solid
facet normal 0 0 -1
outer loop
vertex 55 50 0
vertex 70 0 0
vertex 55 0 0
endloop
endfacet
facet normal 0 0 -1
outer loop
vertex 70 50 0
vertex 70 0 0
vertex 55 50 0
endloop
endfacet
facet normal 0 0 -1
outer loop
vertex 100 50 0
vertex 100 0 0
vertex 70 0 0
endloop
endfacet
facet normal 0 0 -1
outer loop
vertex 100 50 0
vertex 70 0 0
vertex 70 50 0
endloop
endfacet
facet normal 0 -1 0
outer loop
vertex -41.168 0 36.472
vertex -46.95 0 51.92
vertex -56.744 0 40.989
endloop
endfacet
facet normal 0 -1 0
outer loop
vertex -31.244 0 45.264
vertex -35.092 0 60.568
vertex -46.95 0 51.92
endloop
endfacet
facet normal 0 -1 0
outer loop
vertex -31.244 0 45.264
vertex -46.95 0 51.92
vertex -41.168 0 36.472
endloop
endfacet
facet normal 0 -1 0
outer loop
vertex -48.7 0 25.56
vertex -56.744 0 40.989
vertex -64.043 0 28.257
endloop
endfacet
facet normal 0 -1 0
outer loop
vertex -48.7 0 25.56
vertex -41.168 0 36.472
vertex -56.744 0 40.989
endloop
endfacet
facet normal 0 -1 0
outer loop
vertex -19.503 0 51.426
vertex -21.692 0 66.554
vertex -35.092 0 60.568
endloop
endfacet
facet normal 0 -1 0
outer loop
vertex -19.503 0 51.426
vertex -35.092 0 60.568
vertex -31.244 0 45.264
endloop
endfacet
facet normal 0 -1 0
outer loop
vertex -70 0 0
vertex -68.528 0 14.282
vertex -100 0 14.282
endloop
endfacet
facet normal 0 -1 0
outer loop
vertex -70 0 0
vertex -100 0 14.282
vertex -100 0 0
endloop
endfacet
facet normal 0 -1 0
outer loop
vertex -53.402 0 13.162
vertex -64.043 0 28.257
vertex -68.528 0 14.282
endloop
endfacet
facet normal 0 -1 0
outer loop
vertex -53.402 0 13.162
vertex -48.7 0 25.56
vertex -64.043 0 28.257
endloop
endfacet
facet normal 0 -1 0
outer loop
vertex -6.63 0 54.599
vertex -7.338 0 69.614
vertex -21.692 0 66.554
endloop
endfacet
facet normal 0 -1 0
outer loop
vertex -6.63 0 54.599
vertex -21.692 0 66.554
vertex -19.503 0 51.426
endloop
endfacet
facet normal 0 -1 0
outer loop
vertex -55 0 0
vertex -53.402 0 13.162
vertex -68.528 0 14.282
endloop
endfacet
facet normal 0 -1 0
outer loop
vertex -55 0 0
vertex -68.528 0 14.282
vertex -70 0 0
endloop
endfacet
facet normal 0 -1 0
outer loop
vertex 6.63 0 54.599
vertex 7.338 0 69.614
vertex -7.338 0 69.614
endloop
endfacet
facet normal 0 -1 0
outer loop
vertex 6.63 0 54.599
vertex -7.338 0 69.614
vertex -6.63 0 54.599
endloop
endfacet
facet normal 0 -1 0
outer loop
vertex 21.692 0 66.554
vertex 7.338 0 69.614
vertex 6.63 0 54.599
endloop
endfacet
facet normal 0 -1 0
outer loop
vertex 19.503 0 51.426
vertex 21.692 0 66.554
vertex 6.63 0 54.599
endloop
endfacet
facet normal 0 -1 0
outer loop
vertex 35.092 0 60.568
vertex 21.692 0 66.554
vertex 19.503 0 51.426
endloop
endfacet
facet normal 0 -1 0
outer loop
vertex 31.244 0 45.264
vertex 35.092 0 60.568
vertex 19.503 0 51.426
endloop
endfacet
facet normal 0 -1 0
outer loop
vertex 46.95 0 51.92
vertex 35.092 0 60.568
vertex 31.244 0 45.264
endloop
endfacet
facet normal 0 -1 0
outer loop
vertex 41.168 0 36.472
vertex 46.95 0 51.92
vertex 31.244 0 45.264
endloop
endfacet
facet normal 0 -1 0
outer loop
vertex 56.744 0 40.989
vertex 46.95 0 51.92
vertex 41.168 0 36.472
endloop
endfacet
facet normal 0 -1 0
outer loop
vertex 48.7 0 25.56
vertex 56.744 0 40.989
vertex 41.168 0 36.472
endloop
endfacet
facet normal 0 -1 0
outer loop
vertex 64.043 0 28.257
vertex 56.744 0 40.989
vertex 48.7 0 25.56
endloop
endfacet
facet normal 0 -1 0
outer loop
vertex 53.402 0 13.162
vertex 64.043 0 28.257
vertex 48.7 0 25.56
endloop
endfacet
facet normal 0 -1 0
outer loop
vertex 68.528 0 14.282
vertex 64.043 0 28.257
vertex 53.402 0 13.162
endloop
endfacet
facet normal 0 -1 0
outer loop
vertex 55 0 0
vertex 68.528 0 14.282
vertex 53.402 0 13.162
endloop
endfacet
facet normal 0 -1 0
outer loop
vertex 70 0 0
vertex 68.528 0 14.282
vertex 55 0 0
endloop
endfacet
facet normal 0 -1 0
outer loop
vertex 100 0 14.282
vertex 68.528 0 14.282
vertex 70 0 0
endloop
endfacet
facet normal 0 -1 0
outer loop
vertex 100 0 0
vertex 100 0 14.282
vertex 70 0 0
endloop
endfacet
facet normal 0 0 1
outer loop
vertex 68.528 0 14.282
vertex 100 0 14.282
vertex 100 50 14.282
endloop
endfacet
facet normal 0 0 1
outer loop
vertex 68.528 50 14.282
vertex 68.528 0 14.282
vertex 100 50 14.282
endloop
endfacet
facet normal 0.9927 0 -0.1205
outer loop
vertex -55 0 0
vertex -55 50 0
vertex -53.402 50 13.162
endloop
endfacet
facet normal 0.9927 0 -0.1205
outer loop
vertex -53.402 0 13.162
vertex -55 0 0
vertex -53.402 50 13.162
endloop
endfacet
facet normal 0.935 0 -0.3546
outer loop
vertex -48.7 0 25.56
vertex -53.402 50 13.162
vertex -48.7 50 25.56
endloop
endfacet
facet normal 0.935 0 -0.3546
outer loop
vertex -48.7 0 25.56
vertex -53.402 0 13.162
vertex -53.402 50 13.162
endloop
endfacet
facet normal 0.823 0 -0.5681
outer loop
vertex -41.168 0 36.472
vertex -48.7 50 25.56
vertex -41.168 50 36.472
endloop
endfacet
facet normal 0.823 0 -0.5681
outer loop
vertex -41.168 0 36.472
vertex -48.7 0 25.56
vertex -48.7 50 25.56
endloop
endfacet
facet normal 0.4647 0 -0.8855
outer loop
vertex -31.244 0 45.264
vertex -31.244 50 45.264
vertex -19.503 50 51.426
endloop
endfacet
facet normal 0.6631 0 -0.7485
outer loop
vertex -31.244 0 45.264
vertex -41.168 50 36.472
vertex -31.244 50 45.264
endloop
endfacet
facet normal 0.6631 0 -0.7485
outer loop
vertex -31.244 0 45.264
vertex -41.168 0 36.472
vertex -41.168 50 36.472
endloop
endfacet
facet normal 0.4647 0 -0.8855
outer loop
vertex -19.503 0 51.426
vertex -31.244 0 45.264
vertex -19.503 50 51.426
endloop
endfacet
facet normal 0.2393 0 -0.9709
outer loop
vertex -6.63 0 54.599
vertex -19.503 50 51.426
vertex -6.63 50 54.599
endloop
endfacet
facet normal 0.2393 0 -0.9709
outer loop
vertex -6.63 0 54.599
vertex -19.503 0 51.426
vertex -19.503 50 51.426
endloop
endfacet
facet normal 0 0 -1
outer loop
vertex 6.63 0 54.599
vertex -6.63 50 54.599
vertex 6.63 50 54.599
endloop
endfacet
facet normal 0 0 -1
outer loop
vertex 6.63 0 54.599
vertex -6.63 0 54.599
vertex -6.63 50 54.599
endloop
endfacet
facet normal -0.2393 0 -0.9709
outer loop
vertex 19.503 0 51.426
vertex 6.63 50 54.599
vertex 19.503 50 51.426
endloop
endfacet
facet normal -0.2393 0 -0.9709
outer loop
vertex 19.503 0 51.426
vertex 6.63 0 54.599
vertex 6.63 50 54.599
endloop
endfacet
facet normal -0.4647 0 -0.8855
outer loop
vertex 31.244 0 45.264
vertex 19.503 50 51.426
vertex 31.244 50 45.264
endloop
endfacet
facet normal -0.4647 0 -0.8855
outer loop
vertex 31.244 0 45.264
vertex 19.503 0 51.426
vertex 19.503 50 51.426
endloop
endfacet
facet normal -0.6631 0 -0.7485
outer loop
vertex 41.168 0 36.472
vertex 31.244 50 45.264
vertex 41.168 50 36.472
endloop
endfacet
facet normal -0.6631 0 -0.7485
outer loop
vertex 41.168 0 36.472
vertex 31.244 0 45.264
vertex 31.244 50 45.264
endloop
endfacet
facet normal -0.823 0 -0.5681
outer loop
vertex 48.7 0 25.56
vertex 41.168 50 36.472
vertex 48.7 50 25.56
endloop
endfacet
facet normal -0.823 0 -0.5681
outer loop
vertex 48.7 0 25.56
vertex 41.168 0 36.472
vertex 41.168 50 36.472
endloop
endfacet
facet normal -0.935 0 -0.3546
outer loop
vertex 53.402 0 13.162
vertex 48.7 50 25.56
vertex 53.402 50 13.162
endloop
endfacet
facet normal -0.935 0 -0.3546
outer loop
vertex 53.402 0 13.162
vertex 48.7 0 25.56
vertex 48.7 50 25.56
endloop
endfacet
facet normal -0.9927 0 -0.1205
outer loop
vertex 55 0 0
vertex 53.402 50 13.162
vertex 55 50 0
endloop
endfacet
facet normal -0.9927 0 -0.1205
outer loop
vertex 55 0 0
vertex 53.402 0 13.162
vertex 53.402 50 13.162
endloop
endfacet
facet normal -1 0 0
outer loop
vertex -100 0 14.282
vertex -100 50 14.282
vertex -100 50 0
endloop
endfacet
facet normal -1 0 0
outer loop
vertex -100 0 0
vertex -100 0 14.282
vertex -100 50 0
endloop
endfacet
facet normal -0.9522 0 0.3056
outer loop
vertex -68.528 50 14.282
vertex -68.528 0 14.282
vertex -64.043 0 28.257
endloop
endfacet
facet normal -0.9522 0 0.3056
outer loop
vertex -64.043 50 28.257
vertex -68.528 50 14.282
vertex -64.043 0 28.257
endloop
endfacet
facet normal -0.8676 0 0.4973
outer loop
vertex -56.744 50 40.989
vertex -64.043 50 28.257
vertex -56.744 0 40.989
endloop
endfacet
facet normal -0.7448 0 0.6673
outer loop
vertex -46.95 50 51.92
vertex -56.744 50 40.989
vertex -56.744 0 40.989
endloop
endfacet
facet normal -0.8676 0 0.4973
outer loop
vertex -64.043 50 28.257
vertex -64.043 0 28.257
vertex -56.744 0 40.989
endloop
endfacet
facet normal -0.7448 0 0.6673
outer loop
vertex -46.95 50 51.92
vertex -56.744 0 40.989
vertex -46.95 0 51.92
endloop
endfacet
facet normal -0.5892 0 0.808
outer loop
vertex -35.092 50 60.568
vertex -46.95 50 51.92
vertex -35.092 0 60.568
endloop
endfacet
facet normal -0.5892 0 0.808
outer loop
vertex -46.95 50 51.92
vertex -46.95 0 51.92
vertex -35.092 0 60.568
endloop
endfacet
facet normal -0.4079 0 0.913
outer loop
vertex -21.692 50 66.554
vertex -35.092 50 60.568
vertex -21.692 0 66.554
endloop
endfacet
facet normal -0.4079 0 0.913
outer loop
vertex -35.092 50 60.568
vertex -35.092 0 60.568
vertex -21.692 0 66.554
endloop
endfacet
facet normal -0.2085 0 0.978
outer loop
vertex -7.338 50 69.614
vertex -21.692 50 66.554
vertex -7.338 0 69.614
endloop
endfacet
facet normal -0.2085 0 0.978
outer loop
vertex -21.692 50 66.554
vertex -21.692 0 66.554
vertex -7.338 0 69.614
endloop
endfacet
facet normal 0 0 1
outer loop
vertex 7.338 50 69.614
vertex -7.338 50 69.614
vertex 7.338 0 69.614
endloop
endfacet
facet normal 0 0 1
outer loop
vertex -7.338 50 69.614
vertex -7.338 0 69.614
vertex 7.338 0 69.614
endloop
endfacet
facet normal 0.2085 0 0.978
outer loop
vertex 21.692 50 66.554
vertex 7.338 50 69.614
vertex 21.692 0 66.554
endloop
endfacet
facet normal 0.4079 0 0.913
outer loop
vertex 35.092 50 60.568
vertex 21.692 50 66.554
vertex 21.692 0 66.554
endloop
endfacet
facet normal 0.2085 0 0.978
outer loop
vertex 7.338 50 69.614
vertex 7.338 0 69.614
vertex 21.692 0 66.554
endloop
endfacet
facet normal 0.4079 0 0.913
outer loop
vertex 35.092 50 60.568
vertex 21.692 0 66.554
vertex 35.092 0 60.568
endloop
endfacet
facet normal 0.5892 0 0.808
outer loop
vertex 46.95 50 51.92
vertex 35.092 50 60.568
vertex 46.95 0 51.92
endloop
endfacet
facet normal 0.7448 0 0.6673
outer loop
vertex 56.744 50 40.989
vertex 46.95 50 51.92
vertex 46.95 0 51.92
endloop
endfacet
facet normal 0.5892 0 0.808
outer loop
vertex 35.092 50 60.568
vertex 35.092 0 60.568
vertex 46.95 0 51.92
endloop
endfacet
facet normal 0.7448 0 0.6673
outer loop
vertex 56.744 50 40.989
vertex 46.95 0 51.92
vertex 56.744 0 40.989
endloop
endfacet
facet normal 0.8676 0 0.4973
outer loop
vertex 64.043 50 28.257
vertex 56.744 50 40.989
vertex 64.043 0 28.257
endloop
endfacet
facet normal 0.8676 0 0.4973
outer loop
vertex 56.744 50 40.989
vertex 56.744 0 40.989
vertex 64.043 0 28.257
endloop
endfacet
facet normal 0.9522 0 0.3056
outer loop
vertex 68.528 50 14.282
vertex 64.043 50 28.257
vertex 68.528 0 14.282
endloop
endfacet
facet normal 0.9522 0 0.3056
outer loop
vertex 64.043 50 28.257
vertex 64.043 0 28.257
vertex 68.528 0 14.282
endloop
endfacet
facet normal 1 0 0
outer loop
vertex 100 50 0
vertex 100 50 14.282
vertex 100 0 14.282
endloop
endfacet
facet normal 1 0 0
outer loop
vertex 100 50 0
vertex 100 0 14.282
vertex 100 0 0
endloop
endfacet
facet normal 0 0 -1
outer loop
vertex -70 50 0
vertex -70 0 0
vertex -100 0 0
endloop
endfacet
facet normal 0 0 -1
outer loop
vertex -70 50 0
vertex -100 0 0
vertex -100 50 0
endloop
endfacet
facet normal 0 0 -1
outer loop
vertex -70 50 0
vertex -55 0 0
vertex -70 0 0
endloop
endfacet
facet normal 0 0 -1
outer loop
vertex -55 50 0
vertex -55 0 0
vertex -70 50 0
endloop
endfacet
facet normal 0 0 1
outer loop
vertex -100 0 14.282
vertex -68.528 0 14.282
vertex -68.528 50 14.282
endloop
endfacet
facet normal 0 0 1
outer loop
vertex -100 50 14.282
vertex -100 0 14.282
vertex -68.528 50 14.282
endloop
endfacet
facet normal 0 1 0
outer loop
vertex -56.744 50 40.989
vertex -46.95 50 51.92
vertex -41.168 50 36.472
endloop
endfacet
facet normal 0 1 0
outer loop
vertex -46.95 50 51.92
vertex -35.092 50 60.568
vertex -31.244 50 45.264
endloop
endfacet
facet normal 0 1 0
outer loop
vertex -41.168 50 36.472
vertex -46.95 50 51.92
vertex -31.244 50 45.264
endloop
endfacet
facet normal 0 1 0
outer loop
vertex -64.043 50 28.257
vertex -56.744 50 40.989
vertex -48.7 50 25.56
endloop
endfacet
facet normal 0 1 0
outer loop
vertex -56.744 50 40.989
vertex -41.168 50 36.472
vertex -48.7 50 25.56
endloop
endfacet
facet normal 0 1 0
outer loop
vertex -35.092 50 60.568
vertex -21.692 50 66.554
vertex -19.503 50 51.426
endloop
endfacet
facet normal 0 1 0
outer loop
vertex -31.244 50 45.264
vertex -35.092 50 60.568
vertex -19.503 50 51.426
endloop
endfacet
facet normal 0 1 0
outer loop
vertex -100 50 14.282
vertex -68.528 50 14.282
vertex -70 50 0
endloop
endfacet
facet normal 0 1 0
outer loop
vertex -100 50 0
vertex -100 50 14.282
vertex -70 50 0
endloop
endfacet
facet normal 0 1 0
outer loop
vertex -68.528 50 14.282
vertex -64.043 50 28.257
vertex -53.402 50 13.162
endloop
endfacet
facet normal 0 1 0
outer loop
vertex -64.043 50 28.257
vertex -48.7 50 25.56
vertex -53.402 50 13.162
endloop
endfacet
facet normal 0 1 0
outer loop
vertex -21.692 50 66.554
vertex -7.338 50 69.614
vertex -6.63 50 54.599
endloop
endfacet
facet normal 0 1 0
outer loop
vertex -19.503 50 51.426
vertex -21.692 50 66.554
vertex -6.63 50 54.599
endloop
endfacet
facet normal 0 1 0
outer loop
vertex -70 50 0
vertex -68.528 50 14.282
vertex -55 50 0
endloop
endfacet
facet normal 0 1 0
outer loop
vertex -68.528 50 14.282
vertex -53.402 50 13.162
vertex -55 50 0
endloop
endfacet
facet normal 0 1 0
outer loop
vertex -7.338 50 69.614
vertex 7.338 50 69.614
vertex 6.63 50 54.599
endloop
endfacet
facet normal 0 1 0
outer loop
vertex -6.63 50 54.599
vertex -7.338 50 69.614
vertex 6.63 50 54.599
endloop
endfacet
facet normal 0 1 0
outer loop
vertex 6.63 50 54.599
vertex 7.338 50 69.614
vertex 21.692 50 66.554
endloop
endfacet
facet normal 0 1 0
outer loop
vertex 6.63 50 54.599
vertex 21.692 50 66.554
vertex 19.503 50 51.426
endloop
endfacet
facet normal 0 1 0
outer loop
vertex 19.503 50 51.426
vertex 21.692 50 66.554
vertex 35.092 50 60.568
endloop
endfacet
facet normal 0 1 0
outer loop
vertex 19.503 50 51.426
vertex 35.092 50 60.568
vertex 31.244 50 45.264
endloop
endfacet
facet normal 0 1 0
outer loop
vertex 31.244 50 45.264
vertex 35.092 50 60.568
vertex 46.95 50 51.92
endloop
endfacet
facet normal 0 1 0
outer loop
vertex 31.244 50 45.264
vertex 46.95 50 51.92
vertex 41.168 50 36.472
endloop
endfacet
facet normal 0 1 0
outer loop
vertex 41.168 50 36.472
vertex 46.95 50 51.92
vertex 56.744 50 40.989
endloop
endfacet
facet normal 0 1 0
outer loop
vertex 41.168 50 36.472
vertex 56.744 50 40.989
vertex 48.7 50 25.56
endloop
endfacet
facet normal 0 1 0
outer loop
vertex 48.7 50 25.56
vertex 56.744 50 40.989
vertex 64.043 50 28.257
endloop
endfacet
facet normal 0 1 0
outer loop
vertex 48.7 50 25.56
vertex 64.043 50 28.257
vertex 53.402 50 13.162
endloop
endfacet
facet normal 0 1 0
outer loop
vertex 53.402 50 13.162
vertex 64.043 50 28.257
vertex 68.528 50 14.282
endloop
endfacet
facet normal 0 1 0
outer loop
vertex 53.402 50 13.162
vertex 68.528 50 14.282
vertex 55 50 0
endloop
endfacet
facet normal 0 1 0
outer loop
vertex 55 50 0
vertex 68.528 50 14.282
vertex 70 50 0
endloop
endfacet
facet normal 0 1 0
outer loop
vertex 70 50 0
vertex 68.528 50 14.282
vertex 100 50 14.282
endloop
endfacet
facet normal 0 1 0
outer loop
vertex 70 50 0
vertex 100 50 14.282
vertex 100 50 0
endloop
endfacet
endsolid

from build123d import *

# Parameters (mm, degrees)
BOSS_EXTRUDE1_DEPTH = 50
SKETCH3_W           = 14.282150027
SKETCH3_H           = 50
BOSS_EXTRUDE2_DEPTH = 100
CUT_EXTRUDE1_START  = -200
SKETCH4_R           = 55
CUT_EXTRUDE1_DEPTH  = 200


with BuildPart() as part:
    # Sketch1 → Boss-Extrude1 (new body)
    with BuildSketch(Plane(origin=(0, 0, 0), x_dir=(1, 0, 0), z_dir=(0, 1, 0))):
        with BuildLine():
            ThreePointArc((-70, 0), (0, -70), (70, 0))
            Line((70, 0), (55, 0))
            ThreePointArc((55, 0), (0, -55), (-55, 0))
            Line((-55, 0), (-70, 0))
        make_face()
    extrude(amount=BOSS_EXTRUDE1_DEPTH)

    # Sketch3 → Boss-Extrude2 (add, symmetric)
    with BuildSketch(Plane(origin=(0, 0, 0), x_dir=(0, 0, -1), z_dir=(1, 0, 0))):
        with Locations((-7.141075014, 25)):
            Rectangle(SKETCH3_W, SKETCH3_H)
    extrude(amount=BOSS_EXTRUDE2_DEPTH, both=True)

    # Sketch4 → Cut-Extrude1 (cut)
    with BuildSketch(Plane(origin=(0, 50, 0), x_dir=(1, 0, 0), z_dir=(0, 1, 0)).offset(CUT_EXTRUDE1_START)):
        Circle(SKETCH4_R)
    extrude(amount=CUT_EXTRUDE1_DEPTH, mode=Mode.SUBTRACT)


solid = part.part
